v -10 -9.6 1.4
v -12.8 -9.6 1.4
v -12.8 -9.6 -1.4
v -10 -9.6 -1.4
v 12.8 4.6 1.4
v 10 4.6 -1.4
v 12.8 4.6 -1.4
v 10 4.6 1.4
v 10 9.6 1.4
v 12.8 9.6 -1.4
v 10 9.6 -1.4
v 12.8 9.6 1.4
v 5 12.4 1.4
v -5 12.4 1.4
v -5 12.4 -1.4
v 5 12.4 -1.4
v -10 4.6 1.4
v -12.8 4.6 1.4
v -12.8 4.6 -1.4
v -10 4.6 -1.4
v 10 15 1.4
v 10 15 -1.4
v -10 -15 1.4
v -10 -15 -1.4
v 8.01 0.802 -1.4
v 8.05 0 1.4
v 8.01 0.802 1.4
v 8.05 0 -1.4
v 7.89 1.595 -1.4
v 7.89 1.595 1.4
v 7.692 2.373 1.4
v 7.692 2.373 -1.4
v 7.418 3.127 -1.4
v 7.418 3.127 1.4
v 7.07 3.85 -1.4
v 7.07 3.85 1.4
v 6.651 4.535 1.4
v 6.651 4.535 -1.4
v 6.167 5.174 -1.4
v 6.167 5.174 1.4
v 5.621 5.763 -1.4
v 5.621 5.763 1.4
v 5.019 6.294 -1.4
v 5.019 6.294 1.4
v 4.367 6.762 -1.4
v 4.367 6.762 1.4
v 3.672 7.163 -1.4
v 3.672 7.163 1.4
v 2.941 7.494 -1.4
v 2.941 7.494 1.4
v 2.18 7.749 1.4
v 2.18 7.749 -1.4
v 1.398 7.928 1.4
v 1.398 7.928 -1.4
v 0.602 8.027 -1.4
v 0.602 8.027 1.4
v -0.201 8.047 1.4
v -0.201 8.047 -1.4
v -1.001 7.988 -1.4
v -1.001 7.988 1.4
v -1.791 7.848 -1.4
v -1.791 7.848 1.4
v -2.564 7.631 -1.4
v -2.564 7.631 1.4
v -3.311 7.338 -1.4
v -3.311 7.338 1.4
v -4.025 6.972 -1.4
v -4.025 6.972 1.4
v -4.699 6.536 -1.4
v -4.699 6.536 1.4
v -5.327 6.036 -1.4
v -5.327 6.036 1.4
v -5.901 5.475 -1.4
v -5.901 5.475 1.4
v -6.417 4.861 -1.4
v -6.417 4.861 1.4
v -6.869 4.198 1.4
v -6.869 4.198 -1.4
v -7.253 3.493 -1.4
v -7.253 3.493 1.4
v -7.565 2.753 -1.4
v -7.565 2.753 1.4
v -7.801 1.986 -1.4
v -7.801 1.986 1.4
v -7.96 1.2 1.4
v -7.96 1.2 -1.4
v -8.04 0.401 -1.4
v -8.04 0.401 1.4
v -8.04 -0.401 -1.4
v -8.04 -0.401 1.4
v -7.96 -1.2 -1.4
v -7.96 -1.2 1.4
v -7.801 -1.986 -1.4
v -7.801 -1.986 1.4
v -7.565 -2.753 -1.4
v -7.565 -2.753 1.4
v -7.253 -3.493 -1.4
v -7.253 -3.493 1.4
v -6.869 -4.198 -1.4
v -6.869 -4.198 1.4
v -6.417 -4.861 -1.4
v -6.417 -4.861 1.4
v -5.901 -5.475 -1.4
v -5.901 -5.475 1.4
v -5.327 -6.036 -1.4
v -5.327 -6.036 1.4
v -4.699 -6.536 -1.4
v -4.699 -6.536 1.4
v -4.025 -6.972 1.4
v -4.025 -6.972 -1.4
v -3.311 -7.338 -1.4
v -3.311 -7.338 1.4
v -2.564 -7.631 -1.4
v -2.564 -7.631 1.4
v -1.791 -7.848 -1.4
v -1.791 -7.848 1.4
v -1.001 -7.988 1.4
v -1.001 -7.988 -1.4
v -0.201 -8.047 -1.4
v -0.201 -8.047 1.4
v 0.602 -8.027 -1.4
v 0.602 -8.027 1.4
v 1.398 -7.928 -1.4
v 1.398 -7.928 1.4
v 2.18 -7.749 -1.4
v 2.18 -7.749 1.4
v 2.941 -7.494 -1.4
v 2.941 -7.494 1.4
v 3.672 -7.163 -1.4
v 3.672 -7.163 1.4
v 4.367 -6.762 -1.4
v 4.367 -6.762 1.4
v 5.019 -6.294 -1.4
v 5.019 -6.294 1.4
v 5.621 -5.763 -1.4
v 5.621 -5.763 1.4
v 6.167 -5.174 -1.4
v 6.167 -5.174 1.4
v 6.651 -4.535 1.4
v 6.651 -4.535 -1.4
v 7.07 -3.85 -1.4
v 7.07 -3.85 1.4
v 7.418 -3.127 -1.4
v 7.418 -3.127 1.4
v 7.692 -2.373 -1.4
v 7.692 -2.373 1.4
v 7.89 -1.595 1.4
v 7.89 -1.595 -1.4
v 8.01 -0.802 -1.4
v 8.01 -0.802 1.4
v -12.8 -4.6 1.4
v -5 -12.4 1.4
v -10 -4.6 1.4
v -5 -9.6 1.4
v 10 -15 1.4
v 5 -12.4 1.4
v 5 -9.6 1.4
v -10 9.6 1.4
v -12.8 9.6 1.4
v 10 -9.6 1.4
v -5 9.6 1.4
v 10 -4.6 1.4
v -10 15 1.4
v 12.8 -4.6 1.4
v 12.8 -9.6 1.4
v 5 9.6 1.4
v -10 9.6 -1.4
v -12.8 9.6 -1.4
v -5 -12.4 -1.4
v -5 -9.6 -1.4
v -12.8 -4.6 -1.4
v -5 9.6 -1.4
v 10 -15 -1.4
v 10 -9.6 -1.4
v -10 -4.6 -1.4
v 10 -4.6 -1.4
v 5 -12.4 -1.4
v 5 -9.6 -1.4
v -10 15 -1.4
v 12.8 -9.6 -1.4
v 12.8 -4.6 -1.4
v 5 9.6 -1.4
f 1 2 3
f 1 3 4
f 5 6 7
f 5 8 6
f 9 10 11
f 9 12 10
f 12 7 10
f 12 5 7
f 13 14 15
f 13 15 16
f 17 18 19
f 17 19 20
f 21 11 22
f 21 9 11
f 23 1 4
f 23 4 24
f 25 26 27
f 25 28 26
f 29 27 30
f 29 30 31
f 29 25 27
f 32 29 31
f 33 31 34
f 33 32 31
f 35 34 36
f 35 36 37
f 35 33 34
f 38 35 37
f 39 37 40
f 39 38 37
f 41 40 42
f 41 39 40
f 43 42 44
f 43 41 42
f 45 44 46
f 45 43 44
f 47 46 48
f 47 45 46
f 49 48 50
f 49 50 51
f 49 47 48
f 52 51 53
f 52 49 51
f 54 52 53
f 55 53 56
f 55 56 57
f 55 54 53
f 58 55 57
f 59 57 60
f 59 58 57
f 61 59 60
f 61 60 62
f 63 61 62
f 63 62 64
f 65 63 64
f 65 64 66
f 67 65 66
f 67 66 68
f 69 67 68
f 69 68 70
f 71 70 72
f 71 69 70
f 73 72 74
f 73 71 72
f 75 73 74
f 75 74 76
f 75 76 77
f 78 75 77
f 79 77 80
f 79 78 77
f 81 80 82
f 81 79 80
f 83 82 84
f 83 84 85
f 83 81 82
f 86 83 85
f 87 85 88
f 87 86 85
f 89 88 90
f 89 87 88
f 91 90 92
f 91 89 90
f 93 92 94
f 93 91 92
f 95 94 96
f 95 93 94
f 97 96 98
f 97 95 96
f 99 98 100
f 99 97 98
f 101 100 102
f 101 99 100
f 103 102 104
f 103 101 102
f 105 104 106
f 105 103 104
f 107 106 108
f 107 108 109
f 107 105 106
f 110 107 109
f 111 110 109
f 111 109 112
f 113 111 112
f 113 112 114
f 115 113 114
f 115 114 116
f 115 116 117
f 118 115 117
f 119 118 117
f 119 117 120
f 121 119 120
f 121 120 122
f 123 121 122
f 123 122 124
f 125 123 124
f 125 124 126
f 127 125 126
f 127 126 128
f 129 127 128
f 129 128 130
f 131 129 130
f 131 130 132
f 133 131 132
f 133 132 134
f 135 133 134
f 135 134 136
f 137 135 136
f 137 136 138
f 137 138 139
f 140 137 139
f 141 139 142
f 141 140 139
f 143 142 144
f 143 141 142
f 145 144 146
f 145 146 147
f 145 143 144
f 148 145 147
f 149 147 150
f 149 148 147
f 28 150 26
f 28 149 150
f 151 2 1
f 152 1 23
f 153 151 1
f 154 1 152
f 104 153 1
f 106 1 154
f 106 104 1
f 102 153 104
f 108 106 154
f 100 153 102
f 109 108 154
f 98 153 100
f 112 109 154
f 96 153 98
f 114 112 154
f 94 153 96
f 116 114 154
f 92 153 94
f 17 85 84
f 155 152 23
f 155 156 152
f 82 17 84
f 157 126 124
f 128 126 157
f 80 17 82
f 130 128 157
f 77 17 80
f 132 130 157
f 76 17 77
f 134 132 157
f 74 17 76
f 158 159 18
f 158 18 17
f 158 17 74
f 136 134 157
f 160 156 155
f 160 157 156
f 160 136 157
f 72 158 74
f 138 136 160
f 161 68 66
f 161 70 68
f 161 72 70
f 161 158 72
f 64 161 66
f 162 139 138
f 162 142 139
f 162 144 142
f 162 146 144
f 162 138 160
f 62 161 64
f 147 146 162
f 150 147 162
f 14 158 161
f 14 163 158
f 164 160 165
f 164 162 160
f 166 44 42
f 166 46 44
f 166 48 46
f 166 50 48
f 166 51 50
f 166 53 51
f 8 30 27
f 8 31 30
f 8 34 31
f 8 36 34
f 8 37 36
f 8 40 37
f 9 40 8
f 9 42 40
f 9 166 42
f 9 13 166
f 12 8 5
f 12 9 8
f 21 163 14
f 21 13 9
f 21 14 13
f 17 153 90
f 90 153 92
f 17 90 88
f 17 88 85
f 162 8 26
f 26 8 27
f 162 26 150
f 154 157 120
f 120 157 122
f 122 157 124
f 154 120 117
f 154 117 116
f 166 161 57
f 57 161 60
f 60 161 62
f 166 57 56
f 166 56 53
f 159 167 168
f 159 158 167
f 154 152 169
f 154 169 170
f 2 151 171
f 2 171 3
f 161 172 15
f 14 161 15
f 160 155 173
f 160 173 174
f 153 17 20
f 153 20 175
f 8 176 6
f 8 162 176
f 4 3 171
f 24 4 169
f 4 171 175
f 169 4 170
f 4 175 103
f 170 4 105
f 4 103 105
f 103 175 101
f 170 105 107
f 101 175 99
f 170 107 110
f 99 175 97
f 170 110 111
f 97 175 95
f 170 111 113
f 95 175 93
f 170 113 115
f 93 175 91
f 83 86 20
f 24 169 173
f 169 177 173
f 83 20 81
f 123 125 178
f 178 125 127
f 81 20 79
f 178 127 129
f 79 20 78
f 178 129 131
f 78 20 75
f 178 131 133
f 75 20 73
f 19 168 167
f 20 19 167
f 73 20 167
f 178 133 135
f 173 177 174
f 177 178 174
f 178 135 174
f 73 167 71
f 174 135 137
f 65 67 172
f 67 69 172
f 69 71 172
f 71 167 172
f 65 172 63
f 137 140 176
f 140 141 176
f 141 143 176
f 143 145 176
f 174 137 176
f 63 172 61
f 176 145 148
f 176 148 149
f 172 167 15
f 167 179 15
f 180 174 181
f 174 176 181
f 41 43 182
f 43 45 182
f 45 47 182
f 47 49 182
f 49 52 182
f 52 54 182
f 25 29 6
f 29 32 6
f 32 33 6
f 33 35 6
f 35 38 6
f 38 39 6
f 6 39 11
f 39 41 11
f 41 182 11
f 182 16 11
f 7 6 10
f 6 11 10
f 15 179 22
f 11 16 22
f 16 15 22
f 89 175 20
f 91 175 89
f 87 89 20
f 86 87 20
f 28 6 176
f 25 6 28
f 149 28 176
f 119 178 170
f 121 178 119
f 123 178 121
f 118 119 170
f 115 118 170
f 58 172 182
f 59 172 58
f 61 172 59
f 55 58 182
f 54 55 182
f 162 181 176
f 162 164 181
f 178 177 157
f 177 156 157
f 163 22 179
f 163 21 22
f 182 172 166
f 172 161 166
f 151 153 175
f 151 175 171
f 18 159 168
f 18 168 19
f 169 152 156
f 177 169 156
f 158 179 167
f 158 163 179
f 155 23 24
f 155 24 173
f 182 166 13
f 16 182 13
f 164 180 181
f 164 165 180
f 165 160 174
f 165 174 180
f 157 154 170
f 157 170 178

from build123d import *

# Parameters (mm, degrees)
SKETCH_1_R      = 8.05
SKETCH_1_W      = 10
SKETCH_1_H      = 2.8
EXTRUDE_1_DEPTH = 1.4


with BuildPart() as part:
    # Эскиз1 → Бобышка-Вытянуть1 (new, symmetric)
    with BuildSketch(Plane.XY):
        Polygon((-10, 9.6), (-12.8, 9.6), (-12.8, 4.6), (-10, 4.6), (-10, -4.6), (-12.8, -4.6), (-12.8, -9.6), (-10, -9.6), (-10, -15), (10, -15), (10, -9.6), (12.8, -9.6), (12.8, -4.6), (10, -4.6), (10, 4.6), (12.8, 4.6), (12.8, 9.6), (10, 9.6), (10, 15), (-10, 15), align=None)
        Circle(SKETCH_1_R, mode=Mode.SUBTRACT)
        with Locations((0, -11)):
            Rectangle(SKETCH_1_W, SKETCH_1_H, mode=Mode.SUBTRACT)
        with Locations((0, 11)):
            Rectangle(SKETCH_1_W, SKETCH_1_H, mode=Mode.SUBTRACT)
    extrude(amount=EXTRUDE_1_DEPTH, both=True)


solid = part.part
